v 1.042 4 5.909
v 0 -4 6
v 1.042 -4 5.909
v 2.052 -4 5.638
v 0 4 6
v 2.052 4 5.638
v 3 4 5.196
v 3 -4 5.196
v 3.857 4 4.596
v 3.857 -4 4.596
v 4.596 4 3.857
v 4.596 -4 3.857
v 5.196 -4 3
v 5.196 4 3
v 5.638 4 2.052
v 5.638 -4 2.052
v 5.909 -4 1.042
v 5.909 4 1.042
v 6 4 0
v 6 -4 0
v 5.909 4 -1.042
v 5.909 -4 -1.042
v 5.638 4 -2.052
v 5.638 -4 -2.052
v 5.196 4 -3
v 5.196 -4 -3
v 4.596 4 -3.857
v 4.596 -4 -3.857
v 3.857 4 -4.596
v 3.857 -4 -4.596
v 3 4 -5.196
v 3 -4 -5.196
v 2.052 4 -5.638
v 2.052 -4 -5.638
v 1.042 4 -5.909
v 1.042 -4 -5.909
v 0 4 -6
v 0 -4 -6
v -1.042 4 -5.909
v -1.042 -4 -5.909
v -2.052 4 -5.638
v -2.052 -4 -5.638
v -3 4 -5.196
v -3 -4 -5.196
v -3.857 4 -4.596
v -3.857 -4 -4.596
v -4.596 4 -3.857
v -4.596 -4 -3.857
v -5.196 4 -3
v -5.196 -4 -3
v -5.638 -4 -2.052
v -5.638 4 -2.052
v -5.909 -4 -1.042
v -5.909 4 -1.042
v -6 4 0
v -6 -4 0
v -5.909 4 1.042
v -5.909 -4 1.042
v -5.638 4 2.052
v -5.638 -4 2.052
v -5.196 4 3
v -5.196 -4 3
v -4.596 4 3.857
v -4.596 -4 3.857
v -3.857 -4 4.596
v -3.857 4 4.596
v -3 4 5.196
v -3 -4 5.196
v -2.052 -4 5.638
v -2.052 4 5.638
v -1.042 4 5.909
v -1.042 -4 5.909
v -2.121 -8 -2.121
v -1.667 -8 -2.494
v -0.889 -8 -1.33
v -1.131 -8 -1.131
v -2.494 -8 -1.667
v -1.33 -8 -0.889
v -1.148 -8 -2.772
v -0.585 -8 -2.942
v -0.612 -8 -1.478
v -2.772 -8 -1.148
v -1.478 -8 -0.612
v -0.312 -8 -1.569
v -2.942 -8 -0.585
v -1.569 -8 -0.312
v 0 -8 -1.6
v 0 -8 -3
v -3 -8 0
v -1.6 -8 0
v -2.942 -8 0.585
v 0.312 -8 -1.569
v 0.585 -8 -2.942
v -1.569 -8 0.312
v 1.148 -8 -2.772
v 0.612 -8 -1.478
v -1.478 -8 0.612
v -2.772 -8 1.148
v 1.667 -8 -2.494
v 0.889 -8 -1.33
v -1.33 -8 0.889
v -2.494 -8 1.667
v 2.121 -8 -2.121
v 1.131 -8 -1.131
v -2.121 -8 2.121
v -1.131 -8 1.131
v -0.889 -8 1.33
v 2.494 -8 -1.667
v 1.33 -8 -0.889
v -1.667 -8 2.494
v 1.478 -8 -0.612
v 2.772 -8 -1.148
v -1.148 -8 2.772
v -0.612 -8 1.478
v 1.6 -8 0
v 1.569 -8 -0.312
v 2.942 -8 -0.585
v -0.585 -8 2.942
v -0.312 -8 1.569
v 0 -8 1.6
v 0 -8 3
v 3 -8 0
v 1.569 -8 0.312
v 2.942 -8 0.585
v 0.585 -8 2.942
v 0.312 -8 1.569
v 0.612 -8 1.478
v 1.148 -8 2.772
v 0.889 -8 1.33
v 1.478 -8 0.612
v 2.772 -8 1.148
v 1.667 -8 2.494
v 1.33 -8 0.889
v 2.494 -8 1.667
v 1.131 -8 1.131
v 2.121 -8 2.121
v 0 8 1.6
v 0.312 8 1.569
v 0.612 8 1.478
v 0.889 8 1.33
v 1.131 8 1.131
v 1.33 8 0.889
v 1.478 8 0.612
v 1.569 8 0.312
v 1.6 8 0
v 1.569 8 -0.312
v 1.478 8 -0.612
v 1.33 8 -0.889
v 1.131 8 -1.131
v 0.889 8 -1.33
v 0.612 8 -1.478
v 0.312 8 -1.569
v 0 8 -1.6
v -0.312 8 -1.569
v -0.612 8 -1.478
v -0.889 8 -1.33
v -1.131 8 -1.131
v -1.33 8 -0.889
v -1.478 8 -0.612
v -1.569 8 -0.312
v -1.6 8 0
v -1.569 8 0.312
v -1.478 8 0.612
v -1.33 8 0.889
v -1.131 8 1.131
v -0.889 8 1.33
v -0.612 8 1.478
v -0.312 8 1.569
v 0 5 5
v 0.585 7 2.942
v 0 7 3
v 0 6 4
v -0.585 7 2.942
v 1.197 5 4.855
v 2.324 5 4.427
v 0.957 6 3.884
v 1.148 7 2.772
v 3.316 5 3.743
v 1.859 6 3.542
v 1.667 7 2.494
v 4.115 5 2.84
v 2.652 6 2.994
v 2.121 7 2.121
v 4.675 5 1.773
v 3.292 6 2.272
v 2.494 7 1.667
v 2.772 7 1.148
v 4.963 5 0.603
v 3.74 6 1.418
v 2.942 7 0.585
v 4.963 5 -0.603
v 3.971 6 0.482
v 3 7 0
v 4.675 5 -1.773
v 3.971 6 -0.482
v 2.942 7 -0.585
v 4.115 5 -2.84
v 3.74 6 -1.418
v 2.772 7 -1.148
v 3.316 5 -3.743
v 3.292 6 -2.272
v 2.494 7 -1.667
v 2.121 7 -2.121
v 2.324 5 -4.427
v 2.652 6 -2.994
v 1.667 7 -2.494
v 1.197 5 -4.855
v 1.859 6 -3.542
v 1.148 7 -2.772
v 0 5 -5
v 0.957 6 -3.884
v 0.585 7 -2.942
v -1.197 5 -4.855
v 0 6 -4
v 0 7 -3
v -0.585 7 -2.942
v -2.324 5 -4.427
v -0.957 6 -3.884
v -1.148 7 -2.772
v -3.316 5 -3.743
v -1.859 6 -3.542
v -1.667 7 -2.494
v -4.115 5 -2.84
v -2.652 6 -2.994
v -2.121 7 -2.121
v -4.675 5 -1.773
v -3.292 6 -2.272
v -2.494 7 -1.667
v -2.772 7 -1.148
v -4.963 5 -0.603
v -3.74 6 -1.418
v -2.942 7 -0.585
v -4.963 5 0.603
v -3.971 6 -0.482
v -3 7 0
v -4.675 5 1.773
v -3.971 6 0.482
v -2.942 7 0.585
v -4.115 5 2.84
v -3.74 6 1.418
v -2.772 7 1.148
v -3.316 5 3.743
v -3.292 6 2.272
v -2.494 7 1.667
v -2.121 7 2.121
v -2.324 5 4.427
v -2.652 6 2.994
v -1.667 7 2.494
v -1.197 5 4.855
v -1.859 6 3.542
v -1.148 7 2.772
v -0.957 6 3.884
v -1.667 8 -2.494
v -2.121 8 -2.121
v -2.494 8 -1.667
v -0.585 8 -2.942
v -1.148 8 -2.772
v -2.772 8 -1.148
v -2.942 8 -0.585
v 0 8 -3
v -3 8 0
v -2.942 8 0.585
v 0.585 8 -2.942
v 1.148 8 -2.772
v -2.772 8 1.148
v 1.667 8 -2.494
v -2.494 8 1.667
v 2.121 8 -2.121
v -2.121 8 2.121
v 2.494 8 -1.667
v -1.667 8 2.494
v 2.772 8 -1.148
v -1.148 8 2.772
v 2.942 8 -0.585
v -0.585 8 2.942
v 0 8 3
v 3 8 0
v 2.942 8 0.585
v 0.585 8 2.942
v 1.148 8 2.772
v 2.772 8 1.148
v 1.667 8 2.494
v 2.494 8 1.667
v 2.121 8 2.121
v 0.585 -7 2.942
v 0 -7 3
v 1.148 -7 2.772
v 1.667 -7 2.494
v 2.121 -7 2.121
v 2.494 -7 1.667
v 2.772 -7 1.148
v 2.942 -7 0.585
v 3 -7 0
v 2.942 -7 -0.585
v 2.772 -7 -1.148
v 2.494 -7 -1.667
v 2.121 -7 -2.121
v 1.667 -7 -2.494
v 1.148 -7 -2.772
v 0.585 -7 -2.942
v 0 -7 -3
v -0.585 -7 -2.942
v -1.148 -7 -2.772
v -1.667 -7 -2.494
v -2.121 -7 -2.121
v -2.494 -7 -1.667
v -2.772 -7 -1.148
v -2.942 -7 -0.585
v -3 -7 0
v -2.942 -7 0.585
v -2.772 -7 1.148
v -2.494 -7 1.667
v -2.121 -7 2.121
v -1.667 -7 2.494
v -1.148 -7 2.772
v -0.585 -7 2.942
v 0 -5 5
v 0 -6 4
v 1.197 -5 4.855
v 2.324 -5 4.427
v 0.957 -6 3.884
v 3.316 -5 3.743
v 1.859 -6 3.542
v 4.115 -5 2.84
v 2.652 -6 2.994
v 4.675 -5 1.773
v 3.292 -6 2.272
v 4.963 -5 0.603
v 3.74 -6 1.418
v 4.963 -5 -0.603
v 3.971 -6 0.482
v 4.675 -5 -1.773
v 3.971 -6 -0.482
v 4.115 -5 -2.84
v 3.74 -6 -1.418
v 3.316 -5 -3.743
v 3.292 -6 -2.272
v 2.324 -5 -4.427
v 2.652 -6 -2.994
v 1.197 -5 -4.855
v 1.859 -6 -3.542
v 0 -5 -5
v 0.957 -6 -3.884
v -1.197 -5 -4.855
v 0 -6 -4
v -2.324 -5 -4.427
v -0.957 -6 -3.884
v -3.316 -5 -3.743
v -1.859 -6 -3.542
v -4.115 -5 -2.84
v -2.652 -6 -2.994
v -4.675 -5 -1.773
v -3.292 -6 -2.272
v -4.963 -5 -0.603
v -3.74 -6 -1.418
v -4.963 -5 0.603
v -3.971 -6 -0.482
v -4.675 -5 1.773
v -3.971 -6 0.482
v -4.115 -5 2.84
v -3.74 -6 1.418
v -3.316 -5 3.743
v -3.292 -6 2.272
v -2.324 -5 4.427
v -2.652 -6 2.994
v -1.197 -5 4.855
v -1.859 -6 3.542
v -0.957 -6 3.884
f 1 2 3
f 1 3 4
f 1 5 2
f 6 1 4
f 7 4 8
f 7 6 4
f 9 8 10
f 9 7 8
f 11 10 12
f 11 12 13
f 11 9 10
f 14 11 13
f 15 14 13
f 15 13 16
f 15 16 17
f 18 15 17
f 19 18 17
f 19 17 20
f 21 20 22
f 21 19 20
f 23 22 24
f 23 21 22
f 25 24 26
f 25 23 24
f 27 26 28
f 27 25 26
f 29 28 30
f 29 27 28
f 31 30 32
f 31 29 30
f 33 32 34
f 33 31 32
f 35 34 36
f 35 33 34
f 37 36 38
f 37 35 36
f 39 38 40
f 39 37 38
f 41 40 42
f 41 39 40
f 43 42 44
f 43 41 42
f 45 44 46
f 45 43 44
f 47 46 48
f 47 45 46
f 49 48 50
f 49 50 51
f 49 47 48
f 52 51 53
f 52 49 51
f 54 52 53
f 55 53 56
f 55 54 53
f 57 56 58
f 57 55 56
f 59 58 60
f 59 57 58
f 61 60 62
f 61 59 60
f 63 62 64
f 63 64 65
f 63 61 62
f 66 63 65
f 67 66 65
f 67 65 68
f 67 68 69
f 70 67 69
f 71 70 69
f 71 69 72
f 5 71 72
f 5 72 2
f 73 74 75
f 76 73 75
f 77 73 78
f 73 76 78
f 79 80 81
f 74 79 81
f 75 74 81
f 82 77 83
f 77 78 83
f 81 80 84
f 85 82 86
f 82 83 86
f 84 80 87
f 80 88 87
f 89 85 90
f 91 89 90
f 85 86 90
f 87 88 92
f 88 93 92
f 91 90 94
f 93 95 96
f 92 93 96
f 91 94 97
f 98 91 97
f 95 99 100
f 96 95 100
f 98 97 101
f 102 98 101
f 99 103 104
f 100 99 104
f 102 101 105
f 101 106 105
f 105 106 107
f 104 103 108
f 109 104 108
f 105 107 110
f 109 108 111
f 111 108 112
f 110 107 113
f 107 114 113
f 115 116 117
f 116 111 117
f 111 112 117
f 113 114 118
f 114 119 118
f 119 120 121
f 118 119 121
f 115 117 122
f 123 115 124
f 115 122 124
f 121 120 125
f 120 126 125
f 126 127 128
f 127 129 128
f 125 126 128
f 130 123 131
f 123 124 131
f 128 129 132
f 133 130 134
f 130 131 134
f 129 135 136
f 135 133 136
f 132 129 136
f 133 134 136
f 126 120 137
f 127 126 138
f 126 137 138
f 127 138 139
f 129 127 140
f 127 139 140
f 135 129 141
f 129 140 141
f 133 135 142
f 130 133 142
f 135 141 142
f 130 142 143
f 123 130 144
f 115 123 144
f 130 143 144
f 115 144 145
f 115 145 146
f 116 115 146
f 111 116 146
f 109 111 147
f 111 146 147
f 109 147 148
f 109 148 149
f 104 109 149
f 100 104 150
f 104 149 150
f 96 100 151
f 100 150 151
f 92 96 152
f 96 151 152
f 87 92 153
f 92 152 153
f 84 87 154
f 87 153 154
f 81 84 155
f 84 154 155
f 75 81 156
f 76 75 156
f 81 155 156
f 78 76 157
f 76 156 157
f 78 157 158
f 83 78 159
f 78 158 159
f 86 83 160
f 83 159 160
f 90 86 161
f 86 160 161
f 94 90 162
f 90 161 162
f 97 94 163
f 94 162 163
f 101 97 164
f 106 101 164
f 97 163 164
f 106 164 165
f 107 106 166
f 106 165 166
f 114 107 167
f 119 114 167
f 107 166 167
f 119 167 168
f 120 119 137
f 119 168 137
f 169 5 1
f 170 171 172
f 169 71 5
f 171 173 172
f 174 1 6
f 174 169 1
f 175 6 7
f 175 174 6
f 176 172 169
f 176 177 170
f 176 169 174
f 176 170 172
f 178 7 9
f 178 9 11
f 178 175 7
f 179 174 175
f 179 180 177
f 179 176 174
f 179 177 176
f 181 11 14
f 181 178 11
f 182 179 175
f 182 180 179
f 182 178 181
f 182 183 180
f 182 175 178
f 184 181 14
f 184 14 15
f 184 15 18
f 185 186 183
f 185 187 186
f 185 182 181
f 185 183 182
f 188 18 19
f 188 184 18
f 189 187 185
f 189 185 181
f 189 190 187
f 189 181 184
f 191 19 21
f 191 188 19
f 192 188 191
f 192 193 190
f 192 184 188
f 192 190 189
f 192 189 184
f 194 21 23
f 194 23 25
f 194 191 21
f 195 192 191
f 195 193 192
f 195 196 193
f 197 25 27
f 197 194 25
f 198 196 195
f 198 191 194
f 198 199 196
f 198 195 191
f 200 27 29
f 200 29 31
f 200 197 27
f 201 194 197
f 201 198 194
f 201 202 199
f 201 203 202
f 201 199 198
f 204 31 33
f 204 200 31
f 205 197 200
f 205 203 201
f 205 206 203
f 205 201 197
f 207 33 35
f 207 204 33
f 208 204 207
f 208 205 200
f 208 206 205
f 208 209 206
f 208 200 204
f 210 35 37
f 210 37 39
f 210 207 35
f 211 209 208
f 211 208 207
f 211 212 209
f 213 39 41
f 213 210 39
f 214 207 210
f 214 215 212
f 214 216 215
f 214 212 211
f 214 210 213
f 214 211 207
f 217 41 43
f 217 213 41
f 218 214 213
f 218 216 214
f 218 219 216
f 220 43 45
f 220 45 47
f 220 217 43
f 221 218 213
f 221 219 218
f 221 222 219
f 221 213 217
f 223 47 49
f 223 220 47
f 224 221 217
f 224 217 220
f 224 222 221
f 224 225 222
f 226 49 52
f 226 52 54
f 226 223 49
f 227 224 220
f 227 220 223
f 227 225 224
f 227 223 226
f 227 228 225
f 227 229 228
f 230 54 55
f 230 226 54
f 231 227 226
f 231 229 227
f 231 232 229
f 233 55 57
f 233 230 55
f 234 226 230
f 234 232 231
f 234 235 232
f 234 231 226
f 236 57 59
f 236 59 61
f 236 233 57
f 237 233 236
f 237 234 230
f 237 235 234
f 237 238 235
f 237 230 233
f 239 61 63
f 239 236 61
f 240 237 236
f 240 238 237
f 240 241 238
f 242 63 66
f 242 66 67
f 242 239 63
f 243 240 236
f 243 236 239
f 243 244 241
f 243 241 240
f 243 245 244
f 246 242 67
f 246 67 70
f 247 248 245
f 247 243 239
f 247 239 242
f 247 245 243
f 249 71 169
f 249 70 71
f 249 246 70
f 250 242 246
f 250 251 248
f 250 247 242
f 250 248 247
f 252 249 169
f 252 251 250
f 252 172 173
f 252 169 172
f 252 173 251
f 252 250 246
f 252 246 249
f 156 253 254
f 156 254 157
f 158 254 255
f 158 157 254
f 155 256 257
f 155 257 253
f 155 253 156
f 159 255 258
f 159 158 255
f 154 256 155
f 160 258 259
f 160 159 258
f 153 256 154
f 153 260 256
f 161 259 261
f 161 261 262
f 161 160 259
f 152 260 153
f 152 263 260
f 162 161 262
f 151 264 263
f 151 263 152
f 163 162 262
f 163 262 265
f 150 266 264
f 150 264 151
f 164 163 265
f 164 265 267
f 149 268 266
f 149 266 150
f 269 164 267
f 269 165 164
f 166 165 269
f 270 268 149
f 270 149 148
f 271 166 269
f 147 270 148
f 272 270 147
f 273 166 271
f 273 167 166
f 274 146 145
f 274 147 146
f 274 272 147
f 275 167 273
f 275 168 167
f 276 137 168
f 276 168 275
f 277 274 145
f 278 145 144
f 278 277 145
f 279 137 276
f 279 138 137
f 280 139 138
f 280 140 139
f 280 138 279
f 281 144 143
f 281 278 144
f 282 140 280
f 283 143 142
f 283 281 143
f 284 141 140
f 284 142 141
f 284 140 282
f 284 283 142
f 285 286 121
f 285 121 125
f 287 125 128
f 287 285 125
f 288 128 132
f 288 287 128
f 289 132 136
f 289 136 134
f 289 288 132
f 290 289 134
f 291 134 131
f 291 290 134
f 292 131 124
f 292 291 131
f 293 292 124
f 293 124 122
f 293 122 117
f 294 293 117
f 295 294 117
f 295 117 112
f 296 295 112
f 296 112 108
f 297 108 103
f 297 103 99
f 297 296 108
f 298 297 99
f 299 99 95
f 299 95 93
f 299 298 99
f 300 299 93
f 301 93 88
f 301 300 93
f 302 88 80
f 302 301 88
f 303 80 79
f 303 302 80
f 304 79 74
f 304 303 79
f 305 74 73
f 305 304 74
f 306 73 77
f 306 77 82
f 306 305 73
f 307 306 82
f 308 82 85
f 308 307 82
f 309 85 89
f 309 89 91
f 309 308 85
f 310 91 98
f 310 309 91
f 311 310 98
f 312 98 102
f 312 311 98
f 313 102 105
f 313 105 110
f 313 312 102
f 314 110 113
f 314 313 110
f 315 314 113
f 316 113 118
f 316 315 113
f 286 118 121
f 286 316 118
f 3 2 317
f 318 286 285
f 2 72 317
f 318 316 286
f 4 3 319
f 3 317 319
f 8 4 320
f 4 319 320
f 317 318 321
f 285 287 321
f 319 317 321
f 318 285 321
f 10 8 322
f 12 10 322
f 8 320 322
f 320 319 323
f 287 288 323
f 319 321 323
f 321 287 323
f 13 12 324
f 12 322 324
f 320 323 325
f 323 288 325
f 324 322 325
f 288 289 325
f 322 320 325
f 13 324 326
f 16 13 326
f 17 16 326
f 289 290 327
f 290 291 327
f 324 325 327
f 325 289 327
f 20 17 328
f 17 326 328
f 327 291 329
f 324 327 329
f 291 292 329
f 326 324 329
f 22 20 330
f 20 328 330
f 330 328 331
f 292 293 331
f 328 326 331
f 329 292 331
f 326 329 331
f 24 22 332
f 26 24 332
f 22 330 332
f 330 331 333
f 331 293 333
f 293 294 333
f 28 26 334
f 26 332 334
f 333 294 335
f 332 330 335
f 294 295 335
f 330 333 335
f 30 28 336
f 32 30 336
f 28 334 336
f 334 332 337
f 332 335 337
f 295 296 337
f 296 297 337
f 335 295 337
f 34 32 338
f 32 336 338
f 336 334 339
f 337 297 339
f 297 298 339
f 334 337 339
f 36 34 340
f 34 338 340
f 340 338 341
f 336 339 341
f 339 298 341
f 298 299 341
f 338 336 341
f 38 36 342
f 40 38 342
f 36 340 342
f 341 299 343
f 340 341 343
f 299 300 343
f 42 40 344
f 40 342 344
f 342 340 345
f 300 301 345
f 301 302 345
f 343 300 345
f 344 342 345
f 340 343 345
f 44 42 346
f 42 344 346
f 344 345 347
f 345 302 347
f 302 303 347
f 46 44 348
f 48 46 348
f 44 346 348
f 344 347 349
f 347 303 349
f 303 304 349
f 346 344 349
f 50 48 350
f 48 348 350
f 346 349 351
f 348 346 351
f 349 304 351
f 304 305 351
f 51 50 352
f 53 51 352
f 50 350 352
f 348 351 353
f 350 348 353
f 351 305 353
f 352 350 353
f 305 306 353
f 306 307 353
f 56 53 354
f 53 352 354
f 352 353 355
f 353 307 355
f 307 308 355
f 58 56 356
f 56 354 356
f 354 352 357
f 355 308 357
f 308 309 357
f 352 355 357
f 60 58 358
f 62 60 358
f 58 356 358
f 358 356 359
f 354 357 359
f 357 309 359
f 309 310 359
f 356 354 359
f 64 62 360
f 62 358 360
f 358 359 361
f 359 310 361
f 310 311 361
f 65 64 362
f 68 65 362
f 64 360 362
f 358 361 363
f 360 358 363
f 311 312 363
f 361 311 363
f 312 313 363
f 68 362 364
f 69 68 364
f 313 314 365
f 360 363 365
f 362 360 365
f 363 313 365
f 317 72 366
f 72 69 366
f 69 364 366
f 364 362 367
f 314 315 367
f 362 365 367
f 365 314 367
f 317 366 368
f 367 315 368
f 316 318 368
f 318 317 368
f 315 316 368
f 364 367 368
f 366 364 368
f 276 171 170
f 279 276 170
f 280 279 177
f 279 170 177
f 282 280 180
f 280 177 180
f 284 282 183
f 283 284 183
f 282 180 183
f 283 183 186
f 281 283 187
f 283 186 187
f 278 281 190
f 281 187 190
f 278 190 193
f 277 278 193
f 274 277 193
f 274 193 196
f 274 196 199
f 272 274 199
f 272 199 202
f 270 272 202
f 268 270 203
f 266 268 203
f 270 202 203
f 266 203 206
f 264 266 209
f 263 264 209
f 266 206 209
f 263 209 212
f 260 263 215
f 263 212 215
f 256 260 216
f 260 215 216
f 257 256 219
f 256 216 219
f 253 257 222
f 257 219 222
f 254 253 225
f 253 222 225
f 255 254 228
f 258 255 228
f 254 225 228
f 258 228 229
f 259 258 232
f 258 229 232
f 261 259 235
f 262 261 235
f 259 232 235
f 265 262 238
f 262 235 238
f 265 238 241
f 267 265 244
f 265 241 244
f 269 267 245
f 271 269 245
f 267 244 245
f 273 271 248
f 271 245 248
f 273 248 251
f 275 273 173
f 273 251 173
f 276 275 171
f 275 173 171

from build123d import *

# Parameters (mm, degrees)
SKETCH1_R           = 6
BOSS_EXTRUDE1_DEPTH = 4
SKETCH2_R           = 3
BOSS_EXTRUDE2_DEPTH = 4
SKETCH3_R           = 1.6
CUT_EXTRUDE1_DEPTH  = 16
CHAMFER1_SIZE       = 3


with BuildPart() as part:
    # Sketch1 → Boss-Extrude1 (new, symmetric)
    with BuildSketch(Plane(origin=(0, 0, 0), x_dir=(1, 0, 0), z_dir=(0, 1, 0))):
        with Locations(Location((0, 0, 0), (0, 0, 270))):
            Circle(SKETCH1_R)
    extrude(amount=BOSS_EXTRUDE1_DEPTH, both=True)

    # Sketch2 → Boss-Extrude2 (add)
    with BuildSketch(Plane(origin=(0, 4, 0), x_dir=(1, 0, 0), z_dir=(0, 1, 0))):
        with Locations(Location((0, 0, 0), (0, 0, 270))):
            Circle(SKETCH2_R)
    boss_extrude2 = extrude(amount=BOSS_EXTRUDE2_DEPTH)

    # Mirror1: Boss-Extrude2 across plane
    add(boss_extrude2.mirror(Plane.ZX))

    # Sketch3 → Cut-Extrude1 (cut)
    with BuildSketch(Plane(origin=(0, 8, 0), x_dir=(1, 0, 0), z_dir=(0, 1, 0))):
        with Locations(Location((0, 0, 0), (0, 0, 270))):
            Circle(SKETCH3_R)
    extrude(amount=-CUT_EXTRUDE1_DEPTH, mode=Mode.SUBTRACT)

    # Chamfer1
    chamfer1_edges = [part.edges().sort_by_distance(p)[0] for p in [
        (0, -4, -3),
        (0, 4, -3),
    ]]
    chamfer(chamfer1_edges, length=CHAMFER1_SIZE - 0.0001)  # a hair under: the kernel refuses the full size


solid = part.part
